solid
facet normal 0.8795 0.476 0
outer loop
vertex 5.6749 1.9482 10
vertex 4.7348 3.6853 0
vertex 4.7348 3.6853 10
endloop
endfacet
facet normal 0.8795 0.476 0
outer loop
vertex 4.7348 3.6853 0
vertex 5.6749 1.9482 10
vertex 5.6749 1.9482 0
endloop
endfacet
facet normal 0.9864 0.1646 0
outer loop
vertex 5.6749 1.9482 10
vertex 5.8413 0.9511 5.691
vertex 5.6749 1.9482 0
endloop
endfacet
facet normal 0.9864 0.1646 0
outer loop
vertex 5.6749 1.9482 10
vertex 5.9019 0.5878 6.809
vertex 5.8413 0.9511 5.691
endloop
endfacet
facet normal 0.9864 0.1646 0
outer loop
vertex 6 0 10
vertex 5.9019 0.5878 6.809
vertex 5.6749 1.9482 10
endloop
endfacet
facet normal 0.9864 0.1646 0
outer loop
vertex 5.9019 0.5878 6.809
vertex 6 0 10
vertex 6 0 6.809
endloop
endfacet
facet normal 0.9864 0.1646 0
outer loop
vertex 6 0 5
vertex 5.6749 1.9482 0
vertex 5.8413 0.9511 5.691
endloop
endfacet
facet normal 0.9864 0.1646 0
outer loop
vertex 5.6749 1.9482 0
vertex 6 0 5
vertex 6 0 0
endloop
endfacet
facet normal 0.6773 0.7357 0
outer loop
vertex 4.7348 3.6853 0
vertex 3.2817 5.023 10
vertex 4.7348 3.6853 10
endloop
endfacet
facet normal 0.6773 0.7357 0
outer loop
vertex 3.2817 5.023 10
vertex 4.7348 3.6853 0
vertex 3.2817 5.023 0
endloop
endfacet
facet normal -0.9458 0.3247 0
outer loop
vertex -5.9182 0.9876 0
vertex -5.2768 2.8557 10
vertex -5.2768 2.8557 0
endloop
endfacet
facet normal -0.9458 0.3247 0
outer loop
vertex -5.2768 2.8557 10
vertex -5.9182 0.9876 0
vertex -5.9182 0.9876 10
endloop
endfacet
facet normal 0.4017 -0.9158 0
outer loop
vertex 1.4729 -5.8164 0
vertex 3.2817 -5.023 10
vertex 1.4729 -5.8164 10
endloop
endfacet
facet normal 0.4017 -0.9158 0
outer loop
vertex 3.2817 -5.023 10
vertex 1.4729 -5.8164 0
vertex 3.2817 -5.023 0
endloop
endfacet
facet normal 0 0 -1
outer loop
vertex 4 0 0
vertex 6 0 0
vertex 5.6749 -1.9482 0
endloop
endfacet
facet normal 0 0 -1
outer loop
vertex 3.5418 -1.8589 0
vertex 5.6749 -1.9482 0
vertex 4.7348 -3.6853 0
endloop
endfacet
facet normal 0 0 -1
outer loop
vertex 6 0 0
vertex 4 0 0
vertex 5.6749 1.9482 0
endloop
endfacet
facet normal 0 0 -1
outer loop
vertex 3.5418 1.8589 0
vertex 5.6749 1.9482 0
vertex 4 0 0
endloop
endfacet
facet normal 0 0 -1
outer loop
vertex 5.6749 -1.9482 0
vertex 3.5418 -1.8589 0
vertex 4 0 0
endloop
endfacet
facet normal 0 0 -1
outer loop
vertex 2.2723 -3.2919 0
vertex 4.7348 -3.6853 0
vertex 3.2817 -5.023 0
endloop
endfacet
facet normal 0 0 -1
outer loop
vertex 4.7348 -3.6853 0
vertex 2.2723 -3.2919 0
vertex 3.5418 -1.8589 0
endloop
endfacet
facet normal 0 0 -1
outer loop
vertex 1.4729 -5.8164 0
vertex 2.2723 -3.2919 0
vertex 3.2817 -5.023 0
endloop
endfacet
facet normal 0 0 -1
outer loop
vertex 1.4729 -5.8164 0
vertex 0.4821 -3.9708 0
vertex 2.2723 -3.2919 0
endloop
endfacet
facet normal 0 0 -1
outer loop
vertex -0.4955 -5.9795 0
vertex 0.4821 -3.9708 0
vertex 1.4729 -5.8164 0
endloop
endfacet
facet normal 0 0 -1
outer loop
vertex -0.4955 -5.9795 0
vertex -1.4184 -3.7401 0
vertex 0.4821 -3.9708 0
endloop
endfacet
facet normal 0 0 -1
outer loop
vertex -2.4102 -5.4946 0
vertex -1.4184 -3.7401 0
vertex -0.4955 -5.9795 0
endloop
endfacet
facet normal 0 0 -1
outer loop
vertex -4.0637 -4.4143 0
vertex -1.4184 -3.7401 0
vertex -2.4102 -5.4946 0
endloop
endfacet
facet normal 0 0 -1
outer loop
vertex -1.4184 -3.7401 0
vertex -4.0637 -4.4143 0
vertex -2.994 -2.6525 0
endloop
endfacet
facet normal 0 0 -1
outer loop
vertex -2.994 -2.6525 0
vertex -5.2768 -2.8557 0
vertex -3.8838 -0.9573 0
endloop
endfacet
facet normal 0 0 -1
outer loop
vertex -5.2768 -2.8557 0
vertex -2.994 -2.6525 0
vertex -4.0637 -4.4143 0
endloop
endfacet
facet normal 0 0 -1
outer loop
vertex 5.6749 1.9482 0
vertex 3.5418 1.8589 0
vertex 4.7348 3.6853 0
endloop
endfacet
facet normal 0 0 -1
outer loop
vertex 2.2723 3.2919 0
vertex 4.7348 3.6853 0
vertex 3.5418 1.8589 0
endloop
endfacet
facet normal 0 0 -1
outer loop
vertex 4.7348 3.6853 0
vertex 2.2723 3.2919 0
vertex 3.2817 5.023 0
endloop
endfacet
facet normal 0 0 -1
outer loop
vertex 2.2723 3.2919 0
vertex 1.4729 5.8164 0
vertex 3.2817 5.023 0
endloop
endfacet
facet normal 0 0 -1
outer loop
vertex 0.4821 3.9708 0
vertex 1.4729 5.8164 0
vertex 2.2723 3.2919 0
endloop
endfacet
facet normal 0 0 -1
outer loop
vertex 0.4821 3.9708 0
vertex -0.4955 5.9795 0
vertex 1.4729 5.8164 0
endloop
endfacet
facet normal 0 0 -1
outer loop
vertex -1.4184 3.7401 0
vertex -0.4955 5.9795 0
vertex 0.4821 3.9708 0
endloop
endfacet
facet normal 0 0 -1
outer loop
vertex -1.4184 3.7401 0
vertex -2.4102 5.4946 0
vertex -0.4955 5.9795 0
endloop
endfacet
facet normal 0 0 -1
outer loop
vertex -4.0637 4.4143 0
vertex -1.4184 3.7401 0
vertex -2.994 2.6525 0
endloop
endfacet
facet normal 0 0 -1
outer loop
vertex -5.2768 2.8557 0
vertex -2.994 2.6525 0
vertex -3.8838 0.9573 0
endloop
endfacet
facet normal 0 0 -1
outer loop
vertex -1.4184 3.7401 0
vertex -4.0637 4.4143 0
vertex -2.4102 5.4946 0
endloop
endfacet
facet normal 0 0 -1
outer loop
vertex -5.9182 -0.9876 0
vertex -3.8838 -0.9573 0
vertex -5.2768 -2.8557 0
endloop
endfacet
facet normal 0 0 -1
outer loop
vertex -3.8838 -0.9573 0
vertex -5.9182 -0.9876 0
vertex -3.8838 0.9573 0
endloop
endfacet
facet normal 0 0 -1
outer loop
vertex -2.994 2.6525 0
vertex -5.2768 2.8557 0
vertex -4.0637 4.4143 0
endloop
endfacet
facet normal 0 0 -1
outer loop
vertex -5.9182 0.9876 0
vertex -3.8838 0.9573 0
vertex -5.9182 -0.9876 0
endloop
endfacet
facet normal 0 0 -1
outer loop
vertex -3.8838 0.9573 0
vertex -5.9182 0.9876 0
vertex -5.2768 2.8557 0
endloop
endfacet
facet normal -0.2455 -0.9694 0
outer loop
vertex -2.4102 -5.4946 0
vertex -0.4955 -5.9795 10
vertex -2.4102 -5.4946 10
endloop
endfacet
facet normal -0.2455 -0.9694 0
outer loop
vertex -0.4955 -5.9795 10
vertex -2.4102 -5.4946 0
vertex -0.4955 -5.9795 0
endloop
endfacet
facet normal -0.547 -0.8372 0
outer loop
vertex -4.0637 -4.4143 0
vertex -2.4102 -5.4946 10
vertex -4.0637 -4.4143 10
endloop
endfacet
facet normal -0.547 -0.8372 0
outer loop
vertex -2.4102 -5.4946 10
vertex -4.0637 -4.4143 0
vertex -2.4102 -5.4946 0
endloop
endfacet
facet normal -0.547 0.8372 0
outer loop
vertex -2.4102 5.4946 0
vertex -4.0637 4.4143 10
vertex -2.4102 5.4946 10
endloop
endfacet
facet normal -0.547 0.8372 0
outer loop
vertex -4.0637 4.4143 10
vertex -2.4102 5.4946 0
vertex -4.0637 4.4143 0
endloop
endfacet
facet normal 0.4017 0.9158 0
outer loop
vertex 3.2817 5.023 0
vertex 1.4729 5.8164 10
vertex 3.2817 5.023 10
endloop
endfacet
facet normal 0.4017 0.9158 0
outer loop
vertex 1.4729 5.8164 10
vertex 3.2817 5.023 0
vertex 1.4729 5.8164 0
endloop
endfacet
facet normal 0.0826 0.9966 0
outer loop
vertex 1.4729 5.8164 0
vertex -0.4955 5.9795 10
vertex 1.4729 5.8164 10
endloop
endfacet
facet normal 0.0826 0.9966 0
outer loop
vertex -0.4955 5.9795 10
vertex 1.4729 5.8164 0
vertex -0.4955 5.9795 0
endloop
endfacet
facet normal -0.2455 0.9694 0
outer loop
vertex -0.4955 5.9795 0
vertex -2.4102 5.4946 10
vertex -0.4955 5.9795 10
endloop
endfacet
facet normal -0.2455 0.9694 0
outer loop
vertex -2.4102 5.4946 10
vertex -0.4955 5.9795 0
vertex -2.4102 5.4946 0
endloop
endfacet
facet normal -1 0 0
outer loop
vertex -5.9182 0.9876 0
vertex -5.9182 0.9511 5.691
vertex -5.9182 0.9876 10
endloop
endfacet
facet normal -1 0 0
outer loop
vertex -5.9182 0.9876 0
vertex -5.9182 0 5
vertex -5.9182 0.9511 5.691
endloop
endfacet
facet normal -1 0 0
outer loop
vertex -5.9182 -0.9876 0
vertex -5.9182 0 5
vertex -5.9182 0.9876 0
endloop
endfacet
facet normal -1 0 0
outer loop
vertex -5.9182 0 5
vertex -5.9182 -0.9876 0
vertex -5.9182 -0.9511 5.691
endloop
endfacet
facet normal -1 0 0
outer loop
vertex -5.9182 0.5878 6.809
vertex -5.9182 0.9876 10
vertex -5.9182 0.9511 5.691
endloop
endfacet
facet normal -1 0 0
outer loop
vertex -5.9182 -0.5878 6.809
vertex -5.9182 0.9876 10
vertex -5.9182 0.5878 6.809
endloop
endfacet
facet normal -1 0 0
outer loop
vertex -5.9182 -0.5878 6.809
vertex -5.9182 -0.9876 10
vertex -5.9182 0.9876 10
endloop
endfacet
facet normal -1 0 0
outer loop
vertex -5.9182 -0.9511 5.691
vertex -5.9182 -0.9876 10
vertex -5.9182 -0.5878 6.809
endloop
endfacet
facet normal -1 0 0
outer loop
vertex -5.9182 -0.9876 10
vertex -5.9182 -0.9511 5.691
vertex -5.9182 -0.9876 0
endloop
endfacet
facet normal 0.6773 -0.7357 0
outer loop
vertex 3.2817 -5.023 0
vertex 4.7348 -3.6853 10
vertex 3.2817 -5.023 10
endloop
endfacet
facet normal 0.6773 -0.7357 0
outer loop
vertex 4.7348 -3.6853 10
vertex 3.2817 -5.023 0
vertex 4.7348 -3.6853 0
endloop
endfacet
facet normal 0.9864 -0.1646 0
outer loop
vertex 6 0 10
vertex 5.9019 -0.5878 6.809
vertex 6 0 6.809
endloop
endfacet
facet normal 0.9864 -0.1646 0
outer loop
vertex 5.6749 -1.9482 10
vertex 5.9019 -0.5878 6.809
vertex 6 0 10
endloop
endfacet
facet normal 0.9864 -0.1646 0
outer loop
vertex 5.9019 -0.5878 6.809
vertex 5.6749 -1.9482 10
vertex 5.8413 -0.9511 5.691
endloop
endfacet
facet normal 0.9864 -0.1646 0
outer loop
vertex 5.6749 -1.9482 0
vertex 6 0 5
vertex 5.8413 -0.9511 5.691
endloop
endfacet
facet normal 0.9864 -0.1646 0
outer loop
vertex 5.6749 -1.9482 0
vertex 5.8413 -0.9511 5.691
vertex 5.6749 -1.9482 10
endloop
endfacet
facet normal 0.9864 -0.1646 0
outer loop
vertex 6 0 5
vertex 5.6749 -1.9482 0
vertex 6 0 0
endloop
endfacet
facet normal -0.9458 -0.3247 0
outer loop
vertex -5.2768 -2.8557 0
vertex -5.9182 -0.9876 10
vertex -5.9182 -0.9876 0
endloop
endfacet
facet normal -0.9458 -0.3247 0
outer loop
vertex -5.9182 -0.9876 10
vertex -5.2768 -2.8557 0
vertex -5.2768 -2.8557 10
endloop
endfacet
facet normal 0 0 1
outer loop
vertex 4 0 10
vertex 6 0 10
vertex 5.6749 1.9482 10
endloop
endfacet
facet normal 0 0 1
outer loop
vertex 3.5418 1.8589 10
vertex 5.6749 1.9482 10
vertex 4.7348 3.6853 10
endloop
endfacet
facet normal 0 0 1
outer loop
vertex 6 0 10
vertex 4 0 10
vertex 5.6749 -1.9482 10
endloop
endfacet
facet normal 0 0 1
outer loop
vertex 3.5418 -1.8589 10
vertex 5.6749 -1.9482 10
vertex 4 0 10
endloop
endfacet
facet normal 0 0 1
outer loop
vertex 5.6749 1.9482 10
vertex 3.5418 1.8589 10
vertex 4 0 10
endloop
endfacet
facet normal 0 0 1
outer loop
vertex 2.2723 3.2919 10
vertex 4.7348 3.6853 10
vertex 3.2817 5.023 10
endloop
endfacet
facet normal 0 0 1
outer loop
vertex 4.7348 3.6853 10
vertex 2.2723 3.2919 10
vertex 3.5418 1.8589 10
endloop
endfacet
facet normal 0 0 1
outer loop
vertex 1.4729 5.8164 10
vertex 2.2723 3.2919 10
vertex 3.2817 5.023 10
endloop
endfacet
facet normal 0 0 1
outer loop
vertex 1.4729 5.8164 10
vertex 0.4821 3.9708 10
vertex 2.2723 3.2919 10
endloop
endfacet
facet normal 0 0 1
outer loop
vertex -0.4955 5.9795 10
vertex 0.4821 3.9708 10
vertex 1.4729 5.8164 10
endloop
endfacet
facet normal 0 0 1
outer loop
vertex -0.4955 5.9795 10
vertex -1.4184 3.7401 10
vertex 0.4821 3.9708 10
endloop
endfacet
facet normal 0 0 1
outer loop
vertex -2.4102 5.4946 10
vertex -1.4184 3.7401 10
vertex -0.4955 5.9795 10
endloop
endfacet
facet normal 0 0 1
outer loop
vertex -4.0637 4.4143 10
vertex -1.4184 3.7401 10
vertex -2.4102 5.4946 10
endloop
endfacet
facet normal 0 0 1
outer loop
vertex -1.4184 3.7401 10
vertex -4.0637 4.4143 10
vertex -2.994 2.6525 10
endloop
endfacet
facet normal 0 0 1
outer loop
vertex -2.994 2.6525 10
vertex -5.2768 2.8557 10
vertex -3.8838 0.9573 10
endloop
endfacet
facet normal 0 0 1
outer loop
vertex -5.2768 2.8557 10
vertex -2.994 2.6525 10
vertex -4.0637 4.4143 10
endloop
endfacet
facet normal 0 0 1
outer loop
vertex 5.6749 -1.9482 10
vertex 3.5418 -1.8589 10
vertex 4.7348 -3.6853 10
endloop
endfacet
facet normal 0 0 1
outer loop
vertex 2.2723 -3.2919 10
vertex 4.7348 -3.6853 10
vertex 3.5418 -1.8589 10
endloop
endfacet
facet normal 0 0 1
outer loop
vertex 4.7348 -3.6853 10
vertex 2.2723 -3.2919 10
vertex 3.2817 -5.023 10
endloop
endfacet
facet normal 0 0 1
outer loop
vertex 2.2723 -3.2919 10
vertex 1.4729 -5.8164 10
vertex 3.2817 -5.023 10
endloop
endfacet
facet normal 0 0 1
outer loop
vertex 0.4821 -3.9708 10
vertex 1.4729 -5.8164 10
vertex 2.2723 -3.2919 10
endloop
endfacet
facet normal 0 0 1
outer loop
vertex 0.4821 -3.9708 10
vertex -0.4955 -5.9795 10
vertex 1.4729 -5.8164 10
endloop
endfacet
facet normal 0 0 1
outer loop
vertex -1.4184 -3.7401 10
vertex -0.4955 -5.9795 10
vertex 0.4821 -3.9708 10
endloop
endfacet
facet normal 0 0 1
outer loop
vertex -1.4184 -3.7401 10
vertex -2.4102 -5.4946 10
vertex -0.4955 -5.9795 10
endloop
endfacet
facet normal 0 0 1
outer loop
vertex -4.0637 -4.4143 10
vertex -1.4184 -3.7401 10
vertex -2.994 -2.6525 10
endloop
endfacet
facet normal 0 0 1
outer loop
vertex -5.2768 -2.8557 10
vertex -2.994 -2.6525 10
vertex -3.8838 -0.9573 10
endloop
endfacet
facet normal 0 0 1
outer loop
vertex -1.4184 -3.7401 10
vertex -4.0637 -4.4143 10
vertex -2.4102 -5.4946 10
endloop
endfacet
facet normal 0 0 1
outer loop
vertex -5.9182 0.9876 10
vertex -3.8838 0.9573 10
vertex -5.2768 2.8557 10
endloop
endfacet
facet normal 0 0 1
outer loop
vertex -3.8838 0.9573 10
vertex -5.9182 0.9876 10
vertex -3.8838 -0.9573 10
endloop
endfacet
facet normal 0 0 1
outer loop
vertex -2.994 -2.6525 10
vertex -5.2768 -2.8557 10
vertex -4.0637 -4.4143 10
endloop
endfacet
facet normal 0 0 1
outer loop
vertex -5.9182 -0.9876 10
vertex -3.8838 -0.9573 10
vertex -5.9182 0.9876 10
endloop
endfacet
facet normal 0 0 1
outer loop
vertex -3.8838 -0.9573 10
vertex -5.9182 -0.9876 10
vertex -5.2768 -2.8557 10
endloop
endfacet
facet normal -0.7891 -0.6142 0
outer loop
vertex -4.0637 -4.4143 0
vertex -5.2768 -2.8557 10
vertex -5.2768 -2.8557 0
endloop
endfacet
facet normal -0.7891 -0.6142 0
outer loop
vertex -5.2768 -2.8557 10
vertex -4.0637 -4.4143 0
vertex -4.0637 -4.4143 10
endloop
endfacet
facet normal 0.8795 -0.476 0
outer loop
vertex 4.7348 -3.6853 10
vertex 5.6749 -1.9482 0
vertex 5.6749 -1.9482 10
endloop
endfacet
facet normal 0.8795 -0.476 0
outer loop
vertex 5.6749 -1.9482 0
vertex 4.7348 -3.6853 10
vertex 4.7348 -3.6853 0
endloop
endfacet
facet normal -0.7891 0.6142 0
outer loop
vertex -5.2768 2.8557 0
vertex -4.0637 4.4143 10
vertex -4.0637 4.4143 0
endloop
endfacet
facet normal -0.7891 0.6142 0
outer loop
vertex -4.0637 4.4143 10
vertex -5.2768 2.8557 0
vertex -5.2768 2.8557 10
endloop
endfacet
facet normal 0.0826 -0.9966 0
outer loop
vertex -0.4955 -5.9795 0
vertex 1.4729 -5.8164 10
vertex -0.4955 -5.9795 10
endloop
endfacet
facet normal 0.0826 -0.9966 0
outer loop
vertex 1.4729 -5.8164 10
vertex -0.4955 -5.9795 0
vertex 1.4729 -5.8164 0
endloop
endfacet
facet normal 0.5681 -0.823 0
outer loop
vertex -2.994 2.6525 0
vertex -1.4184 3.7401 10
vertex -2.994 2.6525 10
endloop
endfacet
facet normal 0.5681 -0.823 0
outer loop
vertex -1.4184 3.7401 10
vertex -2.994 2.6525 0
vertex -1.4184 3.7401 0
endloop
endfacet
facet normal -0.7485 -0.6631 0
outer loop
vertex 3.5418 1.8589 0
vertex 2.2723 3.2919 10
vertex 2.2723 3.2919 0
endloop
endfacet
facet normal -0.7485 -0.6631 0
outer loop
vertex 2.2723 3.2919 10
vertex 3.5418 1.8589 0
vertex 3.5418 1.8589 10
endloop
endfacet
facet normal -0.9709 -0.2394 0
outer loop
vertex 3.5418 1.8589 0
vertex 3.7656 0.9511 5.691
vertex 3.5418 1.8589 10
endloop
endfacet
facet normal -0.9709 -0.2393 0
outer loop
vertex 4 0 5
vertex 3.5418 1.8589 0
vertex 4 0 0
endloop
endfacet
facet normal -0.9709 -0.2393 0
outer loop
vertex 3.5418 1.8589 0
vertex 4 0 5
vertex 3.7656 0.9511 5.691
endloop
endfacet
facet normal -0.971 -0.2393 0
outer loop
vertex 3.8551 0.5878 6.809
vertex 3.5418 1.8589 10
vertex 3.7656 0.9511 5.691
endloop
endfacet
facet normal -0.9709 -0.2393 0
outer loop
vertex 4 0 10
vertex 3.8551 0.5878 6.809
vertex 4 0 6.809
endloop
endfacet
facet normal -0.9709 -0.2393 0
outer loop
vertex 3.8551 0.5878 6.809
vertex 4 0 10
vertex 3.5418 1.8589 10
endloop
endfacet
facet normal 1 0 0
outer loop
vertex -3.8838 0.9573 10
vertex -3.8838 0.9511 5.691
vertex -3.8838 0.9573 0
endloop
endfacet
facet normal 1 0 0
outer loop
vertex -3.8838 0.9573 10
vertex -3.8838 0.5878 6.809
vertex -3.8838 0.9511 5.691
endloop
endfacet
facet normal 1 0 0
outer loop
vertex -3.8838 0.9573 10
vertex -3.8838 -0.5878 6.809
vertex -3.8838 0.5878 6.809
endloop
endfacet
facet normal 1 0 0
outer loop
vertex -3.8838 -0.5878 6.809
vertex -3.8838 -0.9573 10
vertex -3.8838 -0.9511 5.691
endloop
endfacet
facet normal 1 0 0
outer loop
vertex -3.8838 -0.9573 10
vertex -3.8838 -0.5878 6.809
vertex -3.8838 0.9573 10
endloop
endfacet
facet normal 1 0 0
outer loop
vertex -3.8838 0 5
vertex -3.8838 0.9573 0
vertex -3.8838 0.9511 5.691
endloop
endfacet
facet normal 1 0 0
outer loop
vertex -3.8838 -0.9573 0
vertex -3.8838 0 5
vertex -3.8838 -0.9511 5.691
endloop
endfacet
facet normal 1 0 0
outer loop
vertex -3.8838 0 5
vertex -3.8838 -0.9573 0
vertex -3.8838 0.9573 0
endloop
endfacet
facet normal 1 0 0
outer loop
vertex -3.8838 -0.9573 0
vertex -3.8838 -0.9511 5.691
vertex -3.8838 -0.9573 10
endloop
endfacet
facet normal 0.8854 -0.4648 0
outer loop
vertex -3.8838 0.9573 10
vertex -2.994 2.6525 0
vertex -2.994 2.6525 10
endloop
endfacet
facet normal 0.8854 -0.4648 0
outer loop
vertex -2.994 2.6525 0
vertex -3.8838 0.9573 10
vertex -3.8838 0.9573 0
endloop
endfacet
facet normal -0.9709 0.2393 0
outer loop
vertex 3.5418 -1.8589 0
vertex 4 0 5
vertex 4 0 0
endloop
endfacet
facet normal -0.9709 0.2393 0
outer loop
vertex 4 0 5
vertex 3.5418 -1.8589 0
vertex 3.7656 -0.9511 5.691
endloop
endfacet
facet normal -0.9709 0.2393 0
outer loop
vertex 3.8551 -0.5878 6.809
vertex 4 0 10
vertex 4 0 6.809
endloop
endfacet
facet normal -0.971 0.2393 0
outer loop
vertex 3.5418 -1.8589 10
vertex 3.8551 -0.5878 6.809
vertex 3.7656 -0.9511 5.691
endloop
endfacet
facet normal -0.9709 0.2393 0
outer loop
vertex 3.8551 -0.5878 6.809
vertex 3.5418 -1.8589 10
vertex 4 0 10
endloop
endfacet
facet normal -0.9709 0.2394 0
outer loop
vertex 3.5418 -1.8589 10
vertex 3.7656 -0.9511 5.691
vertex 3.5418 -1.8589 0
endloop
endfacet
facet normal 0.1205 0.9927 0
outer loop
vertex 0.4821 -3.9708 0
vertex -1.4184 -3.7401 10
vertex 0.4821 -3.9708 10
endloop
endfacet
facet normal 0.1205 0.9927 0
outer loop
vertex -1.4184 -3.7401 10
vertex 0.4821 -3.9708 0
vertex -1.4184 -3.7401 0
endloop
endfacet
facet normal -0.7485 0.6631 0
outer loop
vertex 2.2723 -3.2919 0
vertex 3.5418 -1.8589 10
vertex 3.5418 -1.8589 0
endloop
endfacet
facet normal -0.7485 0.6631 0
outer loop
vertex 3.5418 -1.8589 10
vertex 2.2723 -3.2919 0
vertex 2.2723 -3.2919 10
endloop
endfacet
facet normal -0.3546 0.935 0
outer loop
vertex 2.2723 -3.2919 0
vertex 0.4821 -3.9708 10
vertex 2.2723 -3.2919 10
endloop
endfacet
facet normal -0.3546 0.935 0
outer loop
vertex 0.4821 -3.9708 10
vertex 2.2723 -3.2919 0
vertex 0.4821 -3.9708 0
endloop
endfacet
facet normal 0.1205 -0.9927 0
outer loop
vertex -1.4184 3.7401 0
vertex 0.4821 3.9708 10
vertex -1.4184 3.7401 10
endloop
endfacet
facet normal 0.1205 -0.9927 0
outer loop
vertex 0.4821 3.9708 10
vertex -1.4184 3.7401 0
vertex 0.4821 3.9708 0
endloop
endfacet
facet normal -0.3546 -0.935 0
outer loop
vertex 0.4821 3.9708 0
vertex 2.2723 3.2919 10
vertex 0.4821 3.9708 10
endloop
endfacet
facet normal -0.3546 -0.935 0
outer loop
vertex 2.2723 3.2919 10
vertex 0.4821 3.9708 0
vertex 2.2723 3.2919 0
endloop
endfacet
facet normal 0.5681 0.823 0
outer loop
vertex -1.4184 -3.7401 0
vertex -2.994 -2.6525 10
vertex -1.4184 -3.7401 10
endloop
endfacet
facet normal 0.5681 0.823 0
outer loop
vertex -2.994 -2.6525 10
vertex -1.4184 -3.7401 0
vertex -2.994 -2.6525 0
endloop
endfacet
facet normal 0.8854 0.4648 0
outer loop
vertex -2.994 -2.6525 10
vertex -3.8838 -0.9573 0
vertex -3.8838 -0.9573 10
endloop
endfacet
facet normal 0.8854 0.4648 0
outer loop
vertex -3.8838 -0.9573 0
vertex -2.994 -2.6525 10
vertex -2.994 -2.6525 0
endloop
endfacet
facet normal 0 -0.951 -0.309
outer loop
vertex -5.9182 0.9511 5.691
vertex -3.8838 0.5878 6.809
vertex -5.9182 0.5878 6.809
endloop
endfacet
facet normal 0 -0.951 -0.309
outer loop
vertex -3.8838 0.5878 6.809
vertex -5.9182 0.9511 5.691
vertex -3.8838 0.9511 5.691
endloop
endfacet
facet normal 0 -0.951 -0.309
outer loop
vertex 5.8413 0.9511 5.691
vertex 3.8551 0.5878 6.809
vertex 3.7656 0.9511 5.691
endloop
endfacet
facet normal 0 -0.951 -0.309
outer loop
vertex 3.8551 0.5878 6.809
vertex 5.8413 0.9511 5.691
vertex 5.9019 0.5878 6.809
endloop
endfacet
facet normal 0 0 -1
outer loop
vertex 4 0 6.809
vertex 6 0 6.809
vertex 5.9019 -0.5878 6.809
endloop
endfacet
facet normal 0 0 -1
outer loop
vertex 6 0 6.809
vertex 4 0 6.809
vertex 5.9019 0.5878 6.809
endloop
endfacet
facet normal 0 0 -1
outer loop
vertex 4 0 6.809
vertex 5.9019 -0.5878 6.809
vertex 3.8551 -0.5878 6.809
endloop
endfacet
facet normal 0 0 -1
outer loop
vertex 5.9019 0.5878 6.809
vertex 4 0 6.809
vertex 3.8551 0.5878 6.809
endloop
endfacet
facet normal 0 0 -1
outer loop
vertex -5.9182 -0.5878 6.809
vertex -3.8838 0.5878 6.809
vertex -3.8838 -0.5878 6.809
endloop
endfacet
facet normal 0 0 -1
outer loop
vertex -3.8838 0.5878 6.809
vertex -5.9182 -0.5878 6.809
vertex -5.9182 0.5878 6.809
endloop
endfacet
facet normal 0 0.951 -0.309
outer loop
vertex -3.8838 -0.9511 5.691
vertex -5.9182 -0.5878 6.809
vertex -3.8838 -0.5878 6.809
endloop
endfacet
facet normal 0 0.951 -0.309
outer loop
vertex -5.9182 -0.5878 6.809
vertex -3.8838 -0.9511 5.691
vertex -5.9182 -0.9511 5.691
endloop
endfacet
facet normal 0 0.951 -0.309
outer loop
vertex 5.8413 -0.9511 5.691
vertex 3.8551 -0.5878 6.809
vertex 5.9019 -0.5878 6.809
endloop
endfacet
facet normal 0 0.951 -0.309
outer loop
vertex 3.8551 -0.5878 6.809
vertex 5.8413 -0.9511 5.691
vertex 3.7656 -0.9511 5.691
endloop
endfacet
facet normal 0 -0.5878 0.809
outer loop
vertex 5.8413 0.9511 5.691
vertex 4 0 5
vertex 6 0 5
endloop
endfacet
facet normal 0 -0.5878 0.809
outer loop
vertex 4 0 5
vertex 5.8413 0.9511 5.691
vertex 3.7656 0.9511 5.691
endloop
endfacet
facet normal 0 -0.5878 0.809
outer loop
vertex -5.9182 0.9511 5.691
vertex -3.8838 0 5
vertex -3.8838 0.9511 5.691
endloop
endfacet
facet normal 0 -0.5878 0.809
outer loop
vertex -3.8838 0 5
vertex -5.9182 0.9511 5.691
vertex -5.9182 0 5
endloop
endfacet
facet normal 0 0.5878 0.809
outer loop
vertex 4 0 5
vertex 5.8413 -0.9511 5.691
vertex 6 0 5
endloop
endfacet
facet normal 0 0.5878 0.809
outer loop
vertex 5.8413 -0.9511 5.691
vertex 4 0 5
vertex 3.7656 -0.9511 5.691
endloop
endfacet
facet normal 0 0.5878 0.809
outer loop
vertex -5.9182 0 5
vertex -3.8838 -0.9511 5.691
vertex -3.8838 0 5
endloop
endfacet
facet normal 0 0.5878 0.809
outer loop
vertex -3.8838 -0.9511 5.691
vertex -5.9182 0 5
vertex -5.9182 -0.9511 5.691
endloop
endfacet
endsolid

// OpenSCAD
difference() {
cylinder(10,d1=12,d2=12);
cylinder(10,d1=8,d2=8);
rotate([0,90,0])translate([-6,0,-6])cylinder(12,d1=2,d2=2);
}
